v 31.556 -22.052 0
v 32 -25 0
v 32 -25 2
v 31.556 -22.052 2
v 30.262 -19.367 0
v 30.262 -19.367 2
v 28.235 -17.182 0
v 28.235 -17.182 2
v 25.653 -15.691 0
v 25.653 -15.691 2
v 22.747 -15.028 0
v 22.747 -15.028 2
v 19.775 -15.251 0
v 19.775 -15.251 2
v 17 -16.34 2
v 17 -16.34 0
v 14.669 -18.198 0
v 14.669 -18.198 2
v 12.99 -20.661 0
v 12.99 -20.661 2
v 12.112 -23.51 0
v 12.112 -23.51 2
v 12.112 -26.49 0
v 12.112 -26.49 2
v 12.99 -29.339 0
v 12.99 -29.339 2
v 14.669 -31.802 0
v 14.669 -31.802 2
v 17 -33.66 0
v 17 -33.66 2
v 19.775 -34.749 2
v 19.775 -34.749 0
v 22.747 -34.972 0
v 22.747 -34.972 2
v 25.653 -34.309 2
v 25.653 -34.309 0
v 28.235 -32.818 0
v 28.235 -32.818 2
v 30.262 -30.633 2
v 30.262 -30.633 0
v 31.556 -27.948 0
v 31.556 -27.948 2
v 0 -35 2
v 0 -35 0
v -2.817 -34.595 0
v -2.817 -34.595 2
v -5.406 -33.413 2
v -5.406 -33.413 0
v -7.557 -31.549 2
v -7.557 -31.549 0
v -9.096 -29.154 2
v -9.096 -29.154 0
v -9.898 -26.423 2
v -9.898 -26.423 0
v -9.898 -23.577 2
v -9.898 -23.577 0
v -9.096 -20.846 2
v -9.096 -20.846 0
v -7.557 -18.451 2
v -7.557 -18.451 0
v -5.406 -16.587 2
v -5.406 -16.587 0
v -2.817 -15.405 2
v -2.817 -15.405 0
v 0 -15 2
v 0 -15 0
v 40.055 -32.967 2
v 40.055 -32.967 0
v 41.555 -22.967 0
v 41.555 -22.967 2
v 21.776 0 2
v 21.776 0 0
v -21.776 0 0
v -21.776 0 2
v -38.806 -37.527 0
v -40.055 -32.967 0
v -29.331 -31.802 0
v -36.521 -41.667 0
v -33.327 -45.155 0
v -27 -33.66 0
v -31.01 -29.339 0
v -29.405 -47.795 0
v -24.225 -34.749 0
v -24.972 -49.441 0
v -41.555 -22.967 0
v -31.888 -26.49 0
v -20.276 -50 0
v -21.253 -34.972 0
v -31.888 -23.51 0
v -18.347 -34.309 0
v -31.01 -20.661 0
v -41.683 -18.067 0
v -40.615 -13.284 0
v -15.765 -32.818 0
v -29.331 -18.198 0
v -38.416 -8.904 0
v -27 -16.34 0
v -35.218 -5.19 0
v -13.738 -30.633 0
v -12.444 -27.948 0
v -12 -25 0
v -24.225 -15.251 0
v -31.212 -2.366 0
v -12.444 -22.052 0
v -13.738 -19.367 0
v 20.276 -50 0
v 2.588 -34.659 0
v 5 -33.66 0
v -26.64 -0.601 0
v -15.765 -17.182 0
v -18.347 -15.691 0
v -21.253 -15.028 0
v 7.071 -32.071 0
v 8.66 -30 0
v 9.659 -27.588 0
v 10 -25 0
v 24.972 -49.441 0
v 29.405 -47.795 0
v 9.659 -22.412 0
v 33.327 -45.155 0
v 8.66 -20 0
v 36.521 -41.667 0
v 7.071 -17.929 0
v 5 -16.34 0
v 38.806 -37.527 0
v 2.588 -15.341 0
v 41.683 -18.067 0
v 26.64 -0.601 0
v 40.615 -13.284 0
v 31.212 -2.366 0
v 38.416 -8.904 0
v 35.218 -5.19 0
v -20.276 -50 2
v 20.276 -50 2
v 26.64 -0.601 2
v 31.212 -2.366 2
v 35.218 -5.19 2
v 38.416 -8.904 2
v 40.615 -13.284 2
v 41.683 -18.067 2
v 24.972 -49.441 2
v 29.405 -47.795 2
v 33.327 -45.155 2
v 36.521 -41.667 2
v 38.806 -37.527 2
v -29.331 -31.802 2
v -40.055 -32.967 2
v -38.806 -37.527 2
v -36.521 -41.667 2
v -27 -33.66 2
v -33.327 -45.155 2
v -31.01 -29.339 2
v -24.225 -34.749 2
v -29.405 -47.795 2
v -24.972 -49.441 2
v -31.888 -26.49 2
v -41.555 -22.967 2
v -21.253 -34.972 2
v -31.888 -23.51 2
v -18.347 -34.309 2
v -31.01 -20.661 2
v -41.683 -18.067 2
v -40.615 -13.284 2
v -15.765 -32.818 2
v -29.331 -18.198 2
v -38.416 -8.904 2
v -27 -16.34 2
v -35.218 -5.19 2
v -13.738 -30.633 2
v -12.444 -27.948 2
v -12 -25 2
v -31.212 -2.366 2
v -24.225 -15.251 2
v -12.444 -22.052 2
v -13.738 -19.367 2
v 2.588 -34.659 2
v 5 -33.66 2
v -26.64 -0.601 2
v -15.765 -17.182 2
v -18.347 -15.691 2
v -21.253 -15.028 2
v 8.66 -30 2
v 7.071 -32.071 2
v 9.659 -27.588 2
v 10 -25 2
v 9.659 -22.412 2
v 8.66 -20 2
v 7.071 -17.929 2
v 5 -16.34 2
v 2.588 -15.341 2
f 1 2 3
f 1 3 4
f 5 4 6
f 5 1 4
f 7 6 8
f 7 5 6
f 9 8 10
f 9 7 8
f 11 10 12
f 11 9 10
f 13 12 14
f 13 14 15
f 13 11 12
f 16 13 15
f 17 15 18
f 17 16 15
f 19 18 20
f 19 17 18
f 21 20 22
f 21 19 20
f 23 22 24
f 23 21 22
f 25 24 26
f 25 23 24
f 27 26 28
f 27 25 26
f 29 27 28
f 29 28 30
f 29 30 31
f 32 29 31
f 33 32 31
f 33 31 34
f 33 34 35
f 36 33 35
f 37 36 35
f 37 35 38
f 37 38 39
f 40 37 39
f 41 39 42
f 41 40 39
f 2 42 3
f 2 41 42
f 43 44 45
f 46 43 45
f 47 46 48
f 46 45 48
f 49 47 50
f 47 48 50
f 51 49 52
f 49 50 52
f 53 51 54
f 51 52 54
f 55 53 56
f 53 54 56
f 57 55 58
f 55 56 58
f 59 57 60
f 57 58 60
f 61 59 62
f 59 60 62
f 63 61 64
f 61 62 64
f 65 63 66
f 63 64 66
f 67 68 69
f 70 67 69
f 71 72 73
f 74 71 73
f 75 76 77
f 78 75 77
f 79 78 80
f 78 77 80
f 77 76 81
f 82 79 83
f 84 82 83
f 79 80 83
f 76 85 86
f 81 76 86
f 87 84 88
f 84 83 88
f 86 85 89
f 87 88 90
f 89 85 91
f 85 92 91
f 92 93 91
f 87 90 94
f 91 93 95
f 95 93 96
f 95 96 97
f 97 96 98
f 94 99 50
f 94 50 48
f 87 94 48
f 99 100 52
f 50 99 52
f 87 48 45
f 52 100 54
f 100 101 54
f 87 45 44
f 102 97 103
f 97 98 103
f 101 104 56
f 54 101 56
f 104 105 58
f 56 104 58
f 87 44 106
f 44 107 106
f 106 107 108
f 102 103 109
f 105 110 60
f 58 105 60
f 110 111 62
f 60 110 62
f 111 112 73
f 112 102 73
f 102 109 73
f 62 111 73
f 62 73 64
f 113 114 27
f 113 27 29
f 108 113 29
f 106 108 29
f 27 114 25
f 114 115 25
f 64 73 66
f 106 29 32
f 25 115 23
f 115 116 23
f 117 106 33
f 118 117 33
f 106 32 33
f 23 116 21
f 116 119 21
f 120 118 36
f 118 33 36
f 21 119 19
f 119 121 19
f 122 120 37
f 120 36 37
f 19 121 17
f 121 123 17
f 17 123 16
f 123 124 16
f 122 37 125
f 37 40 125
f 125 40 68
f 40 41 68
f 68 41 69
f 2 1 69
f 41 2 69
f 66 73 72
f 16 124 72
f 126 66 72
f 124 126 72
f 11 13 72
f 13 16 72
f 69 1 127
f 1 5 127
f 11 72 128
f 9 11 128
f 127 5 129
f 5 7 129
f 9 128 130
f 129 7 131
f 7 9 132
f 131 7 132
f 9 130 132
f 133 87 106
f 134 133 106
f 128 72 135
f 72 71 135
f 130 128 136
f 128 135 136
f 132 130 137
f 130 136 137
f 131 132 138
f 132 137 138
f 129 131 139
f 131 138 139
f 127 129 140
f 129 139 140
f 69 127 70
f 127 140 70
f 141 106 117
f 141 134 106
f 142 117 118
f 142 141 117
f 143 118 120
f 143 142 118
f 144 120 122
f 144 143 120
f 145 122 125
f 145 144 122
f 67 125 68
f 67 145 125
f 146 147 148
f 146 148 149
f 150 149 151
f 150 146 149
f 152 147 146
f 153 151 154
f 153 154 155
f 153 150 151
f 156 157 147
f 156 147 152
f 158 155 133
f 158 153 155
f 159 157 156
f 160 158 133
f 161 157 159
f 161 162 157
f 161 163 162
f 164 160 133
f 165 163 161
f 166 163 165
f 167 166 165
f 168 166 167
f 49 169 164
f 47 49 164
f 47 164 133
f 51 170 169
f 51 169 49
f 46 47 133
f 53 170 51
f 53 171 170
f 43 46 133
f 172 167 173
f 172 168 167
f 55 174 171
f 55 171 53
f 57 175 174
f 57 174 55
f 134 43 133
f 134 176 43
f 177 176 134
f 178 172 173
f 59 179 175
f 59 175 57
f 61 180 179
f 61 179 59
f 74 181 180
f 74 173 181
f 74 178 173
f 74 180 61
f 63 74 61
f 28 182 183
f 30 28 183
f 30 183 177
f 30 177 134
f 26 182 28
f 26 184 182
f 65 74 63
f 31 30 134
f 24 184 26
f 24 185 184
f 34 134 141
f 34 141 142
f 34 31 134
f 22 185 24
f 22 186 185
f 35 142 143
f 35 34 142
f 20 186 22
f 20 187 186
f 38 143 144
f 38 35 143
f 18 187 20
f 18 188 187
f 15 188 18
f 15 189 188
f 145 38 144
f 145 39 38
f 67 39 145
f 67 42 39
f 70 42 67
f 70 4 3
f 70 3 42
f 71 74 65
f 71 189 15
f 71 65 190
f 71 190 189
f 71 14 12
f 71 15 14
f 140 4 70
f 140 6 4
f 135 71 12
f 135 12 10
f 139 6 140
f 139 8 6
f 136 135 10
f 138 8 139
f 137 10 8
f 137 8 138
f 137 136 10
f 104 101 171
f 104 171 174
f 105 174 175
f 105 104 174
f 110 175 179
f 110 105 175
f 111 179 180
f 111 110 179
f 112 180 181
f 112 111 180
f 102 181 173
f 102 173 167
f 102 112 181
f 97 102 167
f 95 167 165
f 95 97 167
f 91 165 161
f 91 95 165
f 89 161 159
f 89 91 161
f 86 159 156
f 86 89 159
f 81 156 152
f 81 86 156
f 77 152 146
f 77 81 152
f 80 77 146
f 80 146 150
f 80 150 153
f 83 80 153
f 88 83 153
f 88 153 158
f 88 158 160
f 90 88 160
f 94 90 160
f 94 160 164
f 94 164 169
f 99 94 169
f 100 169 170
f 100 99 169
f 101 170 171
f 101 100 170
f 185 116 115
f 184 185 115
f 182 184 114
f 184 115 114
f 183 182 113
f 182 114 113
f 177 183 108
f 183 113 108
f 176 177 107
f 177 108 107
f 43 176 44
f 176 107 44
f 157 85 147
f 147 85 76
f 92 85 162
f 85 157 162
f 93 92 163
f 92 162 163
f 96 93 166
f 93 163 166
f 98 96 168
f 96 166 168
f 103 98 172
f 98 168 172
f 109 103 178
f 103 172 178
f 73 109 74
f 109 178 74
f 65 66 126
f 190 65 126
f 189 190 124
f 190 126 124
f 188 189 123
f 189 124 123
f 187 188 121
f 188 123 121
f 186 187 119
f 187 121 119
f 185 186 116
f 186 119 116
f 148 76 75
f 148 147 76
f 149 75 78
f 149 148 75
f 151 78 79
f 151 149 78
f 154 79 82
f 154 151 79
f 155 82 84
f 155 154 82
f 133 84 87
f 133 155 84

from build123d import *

# Parameters (mm, degrees)
F0_R     = 10
F1_DEPTH = 2
F2_R     = 20


with BuildPart() as f1:
    # F0 (on Top) → F1 (new body)
    with BuildSketch(Plane.XY):
        with BuildLine():
            Line((0, 0), (-45, 0))
            Line((-45, 0), (-37.5, -50))
            Line((-37.5, -50), (0, -50))
            Line((0, -50), (0, -35))
            ThreePointArc((0, -35), (-10, -25), (0, -15))
            Line((0, -15), (0, 0))
        make_face()
        with Locations((-22, -25)):
            Circle(F0_R, mode=Mode.SUBTRACT)
        with BuildLine():
            Line((45, 0), (0, 0))
            Line((0, 0), (0, -15))
            ThreePointArc((0, -15), (7.071068, -17.928932), (10, -25))
            ThreePointArc((10, -25), (7.071068, -32.071068), (0, -35))
            Line((0, -35), (0, -50))
            Line((0, -50), (37.5, -50))
            Line((37.5, -50), (45, 0))
        make_face()
        with Locations((22, -25)):
            Circle(F0_R, mode=Mode.SUBTRACT)
    extrude(amount=F1_DEPTH)

    # F2
    f2_edges = [f1.edges().sort_by_distance(p)[0] for p in [
        (-37.5, -50, 1),
        (37.5, -50, 1),
        (45, 0, 1),
        (-45, 0, 1),
    ]]
    fillet(f2_edges, radius=F2_R)


solid = f1.part
